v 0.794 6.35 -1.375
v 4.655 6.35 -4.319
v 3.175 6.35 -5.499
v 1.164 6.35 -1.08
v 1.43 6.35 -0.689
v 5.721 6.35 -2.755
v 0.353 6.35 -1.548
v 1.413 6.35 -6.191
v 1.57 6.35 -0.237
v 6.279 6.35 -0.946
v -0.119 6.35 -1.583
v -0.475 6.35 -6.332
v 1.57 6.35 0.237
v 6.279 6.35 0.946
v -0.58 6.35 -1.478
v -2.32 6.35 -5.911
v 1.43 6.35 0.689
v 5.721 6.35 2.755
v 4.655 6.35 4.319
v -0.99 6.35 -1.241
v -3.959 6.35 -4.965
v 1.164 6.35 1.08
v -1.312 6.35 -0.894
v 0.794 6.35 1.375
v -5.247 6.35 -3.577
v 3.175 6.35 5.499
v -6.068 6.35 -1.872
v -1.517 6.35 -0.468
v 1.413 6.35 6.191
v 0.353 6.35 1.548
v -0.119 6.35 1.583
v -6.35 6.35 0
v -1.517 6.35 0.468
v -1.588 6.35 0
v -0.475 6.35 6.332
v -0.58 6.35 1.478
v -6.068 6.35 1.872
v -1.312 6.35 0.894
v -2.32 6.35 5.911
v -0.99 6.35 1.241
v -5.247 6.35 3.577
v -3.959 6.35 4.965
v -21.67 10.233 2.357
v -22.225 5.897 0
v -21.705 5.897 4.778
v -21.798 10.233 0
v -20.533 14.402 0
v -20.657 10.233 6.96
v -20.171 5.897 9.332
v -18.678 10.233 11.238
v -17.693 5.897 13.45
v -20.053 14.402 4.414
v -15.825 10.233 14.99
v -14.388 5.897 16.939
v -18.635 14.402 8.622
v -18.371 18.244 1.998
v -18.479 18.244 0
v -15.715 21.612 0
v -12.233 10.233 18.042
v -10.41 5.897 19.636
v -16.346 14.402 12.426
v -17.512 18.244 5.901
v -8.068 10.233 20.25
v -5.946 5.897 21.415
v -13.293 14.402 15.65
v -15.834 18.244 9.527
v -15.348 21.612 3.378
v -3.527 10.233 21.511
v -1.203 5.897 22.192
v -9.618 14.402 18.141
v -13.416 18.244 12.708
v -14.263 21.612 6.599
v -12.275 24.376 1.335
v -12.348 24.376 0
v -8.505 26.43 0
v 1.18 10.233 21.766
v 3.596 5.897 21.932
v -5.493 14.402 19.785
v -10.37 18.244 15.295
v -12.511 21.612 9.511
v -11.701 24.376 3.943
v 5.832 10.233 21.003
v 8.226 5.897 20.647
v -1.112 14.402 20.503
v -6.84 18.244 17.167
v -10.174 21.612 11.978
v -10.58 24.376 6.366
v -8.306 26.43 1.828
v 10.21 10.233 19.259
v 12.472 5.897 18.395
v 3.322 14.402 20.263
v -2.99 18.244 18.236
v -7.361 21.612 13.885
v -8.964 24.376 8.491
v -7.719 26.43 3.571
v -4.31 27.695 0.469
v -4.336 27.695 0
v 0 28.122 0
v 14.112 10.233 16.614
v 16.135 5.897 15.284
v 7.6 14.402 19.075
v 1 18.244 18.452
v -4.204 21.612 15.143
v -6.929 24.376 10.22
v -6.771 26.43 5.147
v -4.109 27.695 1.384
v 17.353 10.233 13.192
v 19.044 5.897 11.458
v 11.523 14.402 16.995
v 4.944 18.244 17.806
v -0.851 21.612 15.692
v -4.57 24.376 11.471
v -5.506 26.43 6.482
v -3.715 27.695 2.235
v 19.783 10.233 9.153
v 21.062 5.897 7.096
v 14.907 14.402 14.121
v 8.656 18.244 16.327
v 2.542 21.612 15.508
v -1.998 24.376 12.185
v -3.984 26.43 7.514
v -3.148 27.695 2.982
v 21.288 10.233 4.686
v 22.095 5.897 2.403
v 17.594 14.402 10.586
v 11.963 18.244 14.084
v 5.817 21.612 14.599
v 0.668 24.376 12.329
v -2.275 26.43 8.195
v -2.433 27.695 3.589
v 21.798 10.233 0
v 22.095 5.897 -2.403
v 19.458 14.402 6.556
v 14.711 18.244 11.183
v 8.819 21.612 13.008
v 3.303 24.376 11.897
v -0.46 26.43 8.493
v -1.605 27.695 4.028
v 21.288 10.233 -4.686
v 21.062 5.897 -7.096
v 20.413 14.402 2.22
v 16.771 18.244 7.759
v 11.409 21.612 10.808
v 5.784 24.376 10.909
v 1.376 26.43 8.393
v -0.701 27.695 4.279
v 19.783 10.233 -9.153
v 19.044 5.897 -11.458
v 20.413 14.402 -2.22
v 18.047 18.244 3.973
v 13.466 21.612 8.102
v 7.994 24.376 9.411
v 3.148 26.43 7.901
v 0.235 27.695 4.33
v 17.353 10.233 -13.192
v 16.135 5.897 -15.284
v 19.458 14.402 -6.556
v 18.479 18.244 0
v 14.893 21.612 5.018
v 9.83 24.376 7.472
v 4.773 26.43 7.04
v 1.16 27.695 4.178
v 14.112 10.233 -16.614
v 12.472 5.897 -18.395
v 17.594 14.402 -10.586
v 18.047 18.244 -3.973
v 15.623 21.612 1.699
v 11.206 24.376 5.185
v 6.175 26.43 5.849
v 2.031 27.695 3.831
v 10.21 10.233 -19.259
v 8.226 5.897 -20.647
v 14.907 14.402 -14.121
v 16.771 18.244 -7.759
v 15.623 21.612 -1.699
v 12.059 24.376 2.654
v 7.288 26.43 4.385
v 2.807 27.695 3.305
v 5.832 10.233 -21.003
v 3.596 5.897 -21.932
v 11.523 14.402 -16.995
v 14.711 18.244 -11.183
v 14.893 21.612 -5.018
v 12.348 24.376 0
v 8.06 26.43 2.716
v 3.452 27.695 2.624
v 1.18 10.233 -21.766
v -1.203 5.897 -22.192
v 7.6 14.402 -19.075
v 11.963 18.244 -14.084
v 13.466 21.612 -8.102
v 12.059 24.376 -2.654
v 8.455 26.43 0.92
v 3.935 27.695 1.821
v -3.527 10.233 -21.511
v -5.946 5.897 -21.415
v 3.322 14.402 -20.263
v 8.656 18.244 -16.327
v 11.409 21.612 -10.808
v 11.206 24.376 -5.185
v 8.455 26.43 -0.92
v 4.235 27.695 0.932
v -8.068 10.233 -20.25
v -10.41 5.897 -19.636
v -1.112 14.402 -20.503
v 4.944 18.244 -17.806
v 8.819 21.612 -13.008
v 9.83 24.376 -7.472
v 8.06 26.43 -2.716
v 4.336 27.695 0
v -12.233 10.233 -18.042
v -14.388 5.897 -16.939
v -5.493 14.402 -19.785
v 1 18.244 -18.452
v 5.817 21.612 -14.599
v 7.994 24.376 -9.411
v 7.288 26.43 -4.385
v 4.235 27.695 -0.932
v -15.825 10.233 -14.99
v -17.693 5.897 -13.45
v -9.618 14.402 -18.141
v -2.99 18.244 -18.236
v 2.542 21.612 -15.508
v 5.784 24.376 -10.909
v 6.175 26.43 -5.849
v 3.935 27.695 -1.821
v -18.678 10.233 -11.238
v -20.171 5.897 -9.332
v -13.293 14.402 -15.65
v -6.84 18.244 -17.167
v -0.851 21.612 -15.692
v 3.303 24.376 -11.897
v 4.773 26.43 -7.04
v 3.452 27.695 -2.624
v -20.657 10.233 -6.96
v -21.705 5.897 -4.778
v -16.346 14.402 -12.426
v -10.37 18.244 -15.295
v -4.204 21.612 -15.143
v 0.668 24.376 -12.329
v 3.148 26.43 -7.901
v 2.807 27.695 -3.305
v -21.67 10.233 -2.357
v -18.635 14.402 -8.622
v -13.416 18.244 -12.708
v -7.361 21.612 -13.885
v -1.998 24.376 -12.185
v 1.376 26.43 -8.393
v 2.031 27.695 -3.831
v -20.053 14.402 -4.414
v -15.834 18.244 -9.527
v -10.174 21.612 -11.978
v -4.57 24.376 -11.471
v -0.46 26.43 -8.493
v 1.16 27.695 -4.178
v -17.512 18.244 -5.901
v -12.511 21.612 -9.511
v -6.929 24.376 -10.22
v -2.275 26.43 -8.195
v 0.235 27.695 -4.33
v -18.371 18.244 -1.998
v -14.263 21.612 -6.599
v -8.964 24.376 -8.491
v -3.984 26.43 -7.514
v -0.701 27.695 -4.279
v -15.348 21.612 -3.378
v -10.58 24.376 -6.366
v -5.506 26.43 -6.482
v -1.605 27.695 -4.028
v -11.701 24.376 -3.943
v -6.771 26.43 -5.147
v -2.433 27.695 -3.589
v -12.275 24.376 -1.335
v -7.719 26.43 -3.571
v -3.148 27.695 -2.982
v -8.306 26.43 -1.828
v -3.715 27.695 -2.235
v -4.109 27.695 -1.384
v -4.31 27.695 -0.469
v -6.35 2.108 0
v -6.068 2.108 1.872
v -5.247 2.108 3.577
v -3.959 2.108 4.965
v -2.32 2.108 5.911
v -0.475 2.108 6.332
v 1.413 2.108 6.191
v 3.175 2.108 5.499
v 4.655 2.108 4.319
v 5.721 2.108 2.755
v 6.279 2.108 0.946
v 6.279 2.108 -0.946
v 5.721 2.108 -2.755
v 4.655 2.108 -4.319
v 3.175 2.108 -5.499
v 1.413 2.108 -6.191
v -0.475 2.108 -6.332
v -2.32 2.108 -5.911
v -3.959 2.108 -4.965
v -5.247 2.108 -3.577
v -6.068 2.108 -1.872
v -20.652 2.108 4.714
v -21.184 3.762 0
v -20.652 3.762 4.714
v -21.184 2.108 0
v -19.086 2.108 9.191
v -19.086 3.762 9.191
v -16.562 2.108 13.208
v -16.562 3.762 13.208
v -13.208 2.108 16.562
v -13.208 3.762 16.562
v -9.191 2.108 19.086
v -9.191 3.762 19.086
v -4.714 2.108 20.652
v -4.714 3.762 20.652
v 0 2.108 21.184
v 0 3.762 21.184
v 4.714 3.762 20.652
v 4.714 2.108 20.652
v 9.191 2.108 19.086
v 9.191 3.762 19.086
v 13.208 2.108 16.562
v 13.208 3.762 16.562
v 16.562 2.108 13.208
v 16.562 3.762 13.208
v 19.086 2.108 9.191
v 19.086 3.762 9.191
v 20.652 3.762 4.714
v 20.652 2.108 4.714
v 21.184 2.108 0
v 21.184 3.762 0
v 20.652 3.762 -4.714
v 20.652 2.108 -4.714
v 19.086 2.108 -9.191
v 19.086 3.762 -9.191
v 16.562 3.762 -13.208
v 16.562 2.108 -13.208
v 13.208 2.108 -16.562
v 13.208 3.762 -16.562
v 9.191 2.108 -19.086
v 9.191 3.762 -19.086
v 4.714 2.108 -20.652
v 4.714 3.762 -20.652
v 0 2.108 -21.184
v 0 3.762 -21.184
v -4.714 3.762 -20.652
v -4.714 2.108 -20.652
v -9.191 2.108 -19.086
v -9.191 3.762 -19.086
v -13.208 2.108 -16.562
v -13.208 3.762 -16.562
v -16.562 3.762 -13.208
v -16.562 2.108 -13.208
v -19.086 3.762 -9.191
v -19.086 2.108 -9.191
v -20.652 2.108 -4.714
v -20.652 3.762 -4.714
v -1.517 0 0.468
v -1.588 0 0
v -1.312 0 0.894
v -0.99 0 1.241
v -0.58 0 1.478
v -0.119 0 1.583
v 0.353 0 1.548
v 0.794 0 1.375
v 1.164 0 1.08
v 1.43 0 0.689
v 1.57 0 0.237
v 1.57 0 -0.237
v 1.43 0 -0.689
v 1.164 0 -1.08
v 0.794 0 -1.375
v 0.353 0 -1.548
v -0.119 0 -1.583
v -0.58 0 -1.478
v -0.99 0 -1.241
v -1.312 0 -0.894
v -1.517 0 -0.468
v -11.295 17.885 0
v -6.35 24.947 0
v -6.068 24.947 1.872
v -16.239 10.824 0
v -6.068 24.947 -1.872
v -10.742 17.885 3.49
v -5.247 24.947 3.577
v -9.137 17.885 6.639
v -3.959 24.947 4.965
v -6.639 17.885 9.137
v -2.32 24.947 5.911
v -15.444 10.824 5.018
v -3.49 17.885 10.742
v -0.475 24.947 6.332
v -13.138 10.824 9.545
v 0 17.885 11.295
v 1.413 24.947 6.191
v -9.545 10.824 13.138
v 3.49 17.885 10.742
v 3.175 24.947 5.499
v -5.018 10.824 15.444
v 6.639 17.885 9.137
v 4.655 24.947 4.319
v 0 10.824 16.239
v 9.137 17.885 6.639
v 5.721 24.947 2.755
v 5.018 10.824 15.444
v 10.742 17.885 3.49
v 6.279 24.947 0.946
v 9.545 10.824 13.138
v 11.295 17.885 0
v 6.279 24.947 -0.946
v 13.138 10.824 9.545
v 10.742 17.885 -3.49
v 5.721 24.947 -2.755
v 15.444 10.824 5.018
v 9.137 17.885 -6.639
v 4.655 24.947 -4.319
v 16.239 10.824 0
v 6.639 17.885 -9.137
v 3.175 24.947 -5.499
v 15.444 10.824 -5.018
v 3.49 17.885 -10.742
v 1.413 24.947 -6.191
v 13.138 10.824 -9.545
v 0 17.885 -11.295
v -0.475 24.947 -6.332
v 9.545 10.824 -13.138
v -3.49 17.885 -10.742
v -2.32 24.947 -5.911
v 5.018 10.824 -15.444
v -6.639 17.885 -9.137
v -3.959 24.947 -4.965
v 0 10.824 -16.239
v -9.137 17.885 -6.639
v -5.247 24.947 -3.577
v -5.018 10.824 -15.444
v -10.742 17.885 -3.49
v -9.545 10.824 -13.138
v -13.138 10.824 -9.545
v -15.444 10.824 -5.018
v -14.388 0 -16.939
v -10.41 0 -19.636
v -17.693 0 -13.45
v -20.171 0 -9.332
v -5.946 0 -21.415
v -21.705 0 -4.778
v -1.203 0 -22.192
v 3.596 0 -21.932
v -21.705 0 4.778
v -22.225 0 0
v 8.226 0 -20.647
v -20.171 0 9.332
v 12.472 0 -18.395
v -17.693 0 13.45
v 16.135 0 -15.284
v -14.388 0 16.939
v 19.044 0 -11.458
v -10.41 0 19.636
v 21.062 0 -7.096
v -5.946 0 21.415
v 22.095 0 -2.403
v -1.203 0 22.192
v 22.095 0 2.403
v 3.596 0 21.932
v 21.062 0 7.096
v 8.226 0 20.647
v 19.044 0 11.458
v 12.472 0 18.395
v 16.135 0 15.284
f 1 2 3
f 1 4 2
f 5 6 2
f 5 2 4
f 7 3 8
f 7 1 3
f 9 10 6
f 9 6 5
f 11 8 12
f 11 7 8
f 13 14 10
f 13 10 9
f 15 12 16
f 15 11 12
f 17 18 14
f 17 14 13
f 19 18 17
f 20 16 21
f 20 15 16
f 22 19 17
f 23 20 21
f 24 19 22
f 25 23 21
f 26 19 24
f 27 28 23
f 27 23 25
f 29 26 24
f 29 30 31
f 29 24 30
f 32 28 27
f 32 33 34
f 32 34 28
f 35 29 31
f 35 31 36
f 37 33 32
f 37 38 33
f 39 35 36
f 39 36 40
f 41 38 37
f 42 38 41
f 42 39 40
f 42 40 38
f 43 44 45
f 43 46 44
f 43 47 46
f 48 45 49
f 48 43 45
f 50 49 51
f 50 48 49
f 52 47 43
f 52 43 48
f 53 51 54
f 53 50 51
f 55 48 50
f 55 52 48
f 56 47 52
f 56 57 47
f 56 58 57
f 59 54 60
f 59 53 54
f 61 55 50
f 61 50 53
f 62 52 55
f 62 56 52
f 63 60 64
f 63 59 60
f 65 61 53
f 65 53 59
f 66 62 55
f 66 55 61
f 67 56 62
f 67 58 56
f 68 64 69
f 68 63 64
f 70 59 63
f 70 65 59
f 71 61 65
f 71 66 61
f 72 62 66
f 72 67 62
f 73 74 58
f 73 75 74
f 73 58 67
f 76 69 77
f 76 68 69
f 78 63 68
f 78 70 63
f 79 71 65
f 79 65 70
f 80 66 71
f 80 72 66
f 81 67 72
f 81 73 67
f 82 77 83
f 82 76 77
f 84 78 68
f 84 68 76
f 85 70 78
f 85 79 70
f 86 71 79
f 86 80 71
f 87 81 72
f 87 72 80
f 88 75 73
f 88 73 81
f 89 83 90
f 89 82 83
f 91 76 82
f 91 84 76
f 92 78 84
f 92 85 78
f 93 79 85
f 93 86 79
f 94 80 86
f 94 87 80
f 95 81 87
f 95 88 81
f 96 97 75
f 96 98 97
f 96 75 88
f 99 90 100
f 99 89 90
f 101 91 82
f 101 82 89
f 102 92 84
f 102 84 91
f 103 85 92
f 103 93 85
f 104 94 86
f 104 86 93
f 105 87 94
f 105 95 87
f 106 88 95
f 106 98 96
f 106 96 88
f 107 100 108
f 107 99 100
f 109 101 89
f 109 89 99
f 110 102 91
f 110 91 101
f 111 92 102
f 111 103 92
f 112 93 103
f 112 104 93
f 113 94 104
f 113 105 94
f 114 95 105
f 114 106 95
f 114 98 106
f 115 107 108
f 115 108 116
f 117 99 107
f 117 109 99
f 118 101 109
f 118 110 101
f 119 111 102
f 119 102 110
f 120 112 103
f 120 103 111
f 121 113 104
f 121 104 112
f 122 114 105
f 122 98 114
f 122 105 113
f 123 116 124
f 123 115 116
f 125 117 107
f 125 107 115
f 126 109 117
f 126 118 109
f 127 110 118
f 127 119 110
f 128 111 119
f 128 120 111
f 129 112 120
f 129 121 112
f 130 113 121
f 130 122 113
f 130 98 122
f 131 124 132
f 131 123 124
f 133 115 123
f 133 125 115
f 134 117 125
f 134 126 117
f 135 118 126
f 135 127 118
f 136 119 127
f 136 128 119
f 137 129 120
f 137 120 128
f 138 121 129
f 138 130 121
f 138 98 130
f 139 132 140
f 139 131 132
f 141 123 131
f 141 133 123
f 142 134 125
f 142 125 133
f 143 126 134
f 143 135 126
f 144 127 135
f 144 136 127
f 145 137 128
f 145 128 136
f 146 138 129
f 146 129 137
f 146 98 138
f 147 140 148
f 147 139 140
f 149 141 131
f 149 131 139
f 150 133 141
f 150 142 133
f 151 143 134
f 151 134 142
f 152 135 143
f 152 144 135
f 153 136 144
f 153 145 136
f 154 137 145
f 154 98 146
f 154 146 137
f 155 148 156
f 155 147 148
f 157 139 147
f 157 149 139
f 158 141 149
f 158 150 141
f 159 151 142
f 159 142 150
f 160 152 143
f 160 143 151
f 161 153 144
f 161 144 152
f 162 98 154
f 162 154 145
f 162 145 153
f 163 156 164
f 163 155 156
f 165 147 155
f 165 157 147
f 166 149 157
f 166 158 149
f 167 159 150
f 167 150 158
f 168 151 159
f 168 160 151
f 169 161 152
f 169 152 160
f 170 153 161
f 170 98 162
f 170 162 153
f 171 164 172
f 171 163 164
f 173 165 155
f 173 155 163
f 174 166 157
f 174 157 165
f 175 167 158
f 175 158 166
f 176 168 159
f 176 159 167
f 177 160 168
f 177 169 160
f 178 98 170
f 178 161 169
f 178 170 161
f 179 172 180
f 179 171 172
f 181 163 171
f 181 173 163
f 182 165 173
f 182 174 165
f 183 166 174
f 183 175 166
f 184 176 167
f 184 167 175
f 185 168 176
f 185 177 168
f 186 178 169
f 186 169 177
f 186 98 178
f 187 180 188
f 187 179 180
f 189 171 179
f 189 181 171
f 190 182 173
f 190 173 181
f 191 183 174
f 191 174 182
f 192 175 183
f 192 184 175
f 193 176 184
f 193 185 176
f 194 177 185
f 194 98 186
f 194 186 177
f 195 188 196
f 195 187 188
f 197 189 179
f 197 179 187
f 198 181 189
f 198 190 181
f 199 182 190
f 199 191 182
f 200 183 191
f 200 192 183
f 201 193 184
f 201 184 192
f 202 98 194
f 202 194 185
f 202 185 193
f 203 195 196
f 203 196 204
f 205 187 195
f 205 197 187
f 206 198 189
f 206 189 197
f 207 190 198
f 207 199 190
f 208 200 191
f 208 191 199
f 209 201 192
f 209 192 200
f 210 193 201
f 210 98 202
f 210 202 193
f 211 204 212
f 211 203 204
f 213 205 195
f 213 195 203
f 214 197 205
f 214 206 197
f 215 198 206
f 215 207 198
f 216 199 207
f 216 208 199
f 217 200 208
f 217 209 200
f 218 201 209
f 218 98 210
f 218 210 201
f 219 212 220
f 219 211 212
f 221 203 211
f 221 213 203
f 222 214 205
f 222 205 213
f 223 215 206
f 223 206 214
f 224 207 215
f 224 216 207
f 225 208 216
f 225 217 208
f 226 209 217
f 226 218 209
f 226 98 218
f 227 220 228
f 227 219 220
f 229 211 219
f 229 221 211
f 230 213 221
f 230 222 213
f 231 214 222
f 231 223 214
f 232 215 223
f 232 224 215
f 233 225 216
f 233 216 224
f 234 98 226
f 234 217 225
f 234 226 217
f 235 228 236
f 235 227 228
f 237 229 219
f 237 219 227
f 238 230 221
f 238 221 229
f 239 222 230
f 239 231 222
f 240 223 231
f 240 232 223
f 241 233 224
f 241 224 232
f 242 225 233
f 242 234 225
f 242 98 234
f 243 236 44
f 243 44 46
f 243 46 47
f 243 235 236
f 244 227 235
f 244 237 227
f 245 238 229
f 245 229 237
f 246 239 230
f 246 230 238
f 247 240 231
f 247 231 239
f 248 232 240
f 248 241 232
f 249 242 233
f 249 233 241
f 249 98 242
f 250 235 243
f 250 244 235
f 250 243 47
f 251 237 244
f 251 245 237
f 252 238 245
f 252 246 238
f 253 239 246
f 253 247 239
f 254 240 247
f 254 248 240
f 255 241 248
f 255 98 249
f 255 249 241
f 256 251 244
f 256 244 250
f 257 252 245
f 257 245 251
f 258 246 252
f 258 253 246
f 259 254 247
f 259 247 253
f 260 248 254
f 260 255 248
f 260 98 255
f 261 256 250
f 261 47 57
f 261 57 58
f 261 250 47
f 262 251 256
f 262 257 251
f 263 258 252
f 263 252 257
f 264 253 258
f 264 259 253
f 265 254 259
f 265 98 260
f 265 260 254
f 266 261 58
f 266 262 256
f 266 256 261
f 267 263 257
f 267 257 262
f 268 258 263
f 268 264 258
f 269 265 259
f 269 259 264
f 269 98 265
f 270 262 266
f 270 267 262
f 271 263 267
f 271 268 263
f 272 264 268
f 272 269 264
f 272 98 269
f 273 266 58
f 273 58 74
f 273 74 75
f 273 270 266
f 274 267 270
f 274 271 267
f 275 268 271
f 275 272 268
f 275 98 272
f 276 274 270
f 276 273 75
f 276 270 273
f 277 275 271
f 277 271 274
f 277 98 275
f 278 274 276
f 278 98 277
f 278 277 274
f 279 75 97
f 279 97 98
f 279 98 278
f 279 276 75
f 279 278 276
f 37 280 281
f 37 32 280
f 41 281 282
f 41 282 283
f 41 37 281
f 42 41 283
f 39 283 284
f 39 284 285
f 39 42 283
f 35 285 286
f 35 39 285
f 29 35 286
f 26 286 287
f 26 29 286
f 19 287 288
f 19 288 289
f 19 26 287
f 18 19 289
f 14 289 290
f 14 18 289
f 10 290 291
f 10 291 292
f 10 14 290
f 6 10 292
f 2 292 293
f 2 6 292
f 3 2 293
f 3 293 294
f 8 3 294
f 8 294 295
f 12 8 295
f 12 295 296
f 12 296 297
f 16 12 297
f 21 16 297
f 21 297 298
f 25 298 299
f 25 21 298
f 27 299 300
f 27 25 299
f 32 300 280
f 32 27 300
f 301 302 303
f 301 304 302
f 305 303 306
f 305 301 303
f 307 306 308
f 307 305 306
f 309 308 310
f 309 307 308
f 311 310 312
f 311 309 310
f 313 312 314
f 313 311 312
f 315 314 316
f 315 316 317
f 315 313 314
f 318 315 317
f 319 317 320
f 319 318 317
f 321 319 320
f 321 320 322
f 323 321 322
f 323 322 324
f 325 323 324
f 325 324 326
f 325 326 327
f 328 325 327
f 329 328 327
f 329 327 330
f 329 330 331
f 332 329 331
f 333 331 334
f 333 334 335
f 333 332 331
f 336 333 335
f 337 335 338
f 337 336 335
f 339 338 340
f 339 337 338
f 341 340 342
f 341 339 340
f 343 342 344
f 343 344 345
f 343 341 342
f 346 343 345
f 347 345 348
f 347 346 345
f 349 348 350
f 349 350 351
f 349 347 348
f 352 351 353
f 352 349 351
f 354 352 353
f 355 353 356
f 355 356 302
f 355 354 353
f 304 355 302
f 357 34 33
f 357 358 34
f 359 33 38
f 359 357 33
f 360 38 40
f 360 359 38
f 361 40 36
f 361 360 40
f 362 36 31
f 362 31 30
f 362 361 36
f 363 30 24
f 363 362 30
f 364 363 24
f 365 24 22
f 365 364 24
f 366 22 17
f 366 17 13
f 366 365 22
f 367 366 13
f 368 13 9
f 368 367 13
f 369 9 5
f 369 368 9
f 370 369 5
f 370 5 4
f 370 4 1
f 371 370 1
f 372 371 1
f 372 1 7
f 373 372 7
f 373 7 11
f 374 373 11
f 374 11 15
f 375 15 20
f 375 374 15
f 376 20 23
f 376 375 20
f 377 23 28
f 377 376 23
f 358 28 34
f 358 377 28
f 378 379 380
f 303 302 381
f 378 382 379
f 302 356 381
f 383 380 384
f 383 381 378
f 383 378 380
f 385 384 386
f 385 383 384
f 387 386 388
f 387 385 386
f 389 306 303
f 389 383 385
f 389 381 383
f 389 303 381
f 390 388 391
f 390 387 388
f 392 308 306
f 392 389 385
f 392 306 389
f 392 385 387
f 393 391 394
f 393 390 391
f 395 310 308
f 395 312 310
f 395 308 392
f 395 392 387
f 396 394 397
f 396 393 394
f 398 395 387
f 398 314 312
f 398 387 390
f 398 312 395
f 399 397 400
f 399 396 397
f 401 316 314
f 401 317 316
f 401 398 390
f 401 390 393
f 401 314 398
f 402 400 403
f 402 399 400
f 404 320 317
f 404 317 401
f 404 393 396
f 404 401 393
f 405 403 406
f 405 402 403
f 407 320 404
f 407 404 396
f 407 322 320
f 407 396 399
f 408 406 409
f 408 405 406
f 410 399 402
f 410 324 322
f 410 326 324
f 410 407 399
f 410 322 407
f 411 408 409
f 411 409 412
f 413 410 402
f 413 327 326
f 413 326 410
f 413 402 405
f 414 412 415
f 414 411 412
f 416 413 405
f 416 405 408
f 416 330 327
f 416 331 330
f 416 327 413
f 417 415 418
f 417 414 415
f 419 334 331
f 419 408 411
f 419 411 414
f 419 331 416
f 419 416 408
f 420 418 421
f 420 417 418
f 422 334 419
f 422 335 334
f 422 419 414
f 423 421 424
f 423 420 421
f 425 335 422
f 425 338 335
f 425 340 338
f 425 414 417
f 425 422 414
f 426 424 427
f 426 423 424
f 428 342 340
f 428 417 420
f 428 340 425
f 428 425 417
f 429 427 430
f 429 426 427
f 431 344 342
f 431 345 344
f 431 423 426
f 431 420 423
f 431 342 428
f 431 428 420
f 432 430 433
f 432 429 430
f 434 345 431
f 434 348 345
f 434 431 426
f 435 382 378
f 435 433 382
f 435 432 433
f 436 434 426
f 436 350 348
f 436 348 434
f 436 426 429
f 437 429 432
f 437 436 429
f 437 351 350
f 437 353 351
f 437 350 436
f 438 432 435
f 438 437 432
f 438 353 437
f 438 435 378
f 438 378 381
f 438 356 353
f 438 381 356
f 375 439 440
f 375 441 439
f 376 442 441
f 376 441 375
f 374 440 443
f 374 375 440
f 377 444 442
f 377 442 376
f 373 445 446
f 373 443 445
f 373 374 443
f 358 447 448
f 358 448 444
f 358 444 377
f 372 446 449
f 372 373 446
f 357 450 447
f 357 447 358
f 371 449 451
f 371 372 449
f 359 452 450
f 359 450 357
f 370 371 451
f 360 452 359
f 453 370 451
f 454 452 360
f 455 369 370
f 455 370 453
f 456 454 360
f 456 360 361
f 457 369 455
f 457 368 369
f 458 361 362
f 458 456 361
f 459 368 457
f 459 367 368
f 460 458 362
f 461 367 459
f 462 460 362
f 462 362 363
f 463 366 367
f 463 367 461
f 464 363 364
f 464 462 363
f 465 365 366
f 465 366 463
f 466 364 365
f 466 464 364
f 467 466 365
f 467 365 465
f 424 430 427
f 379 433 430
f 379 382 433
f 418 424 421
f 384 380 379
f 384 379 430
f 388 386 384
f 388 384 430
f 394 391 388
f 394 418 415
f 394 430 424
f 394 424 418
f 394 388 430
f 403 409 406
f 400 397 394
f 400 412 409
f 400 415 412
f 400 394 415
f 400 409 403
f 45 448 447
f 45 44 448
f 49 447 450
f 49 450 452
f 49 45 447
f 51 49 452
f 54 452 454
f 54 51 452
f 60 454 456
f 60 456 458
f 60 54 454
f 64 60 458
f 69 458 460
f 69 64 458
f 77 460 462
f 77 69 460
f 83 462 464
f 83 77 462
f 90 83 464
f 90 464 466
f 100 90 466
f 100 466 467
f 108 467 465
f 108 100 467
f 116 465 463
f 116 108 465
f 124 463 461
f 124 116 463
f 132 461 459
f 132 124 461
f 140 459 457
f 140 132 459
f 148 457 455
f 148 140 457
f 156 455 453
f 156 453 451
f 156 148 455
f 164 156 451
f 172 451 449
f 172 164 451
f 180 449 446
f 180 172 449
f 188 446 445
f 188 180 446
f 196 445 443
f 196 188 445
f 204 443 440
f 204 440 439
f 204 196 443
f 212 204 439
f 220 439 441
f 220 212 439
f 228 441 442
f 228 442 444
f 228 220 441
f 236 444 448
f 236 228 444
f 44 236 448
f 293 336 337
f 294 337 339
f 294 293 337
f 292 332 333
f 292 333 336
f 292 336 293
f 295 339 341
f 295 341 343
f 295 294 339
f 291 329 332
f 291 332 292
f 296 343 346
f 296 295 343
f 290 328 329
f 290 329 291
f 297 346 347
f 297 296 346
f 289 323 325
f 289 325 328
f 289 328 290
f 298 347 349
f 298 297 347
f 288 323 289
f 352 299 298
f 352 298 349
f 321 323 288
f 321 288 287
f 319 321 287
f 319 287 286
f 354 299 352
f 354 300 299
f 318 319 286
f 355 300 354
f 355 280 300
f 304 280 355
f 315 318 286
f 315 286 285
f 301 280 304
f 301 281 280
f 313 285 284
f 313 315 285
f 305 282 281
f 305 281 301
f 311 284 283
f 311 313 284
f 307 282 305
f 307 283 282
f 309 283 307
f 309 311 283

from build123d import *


with BuildPart() as part:
    # Sketch1 → Revolve1 (revolve)
    with BuildSketch(Plane.XY):
        with BuildLine():
            Line((-1.5875, 0), (-22.225, 0))
            Line((-22.225, 0), (-22.225, 5.896631452))
            ThreePointArc((-22.225, 5.896631452), (-15.715448212, 21.612079664), (0, 28.121631452))
            Line((0, 28.121631452), (0, 24.946631452))
            Line((0, 24.946631452), (-6.35, 24.946631452))
            Line((-6.35, 24.946631452), (-21.1836, 3.76205518))
            Line((-21.1836, 3.76205518), (-21.1836, 2.1082))
            Line((-21.1836, 2.1082), (-6.35, 2.1082))
            Line((-6.35, 2.1082), (-6.35, 6.35))
            Line((-6.35, 6.35), (-1.5875, 6.35))
            Line((-1.5875, 6.35), (-1.5875, 2.1082))
            Line((-1.5875, 2.1082), (-1.5875, 0))
        make_face()
    revolve(axis=Axis((0, 0, 0), (0, 1, 0)))


solid = part.part
